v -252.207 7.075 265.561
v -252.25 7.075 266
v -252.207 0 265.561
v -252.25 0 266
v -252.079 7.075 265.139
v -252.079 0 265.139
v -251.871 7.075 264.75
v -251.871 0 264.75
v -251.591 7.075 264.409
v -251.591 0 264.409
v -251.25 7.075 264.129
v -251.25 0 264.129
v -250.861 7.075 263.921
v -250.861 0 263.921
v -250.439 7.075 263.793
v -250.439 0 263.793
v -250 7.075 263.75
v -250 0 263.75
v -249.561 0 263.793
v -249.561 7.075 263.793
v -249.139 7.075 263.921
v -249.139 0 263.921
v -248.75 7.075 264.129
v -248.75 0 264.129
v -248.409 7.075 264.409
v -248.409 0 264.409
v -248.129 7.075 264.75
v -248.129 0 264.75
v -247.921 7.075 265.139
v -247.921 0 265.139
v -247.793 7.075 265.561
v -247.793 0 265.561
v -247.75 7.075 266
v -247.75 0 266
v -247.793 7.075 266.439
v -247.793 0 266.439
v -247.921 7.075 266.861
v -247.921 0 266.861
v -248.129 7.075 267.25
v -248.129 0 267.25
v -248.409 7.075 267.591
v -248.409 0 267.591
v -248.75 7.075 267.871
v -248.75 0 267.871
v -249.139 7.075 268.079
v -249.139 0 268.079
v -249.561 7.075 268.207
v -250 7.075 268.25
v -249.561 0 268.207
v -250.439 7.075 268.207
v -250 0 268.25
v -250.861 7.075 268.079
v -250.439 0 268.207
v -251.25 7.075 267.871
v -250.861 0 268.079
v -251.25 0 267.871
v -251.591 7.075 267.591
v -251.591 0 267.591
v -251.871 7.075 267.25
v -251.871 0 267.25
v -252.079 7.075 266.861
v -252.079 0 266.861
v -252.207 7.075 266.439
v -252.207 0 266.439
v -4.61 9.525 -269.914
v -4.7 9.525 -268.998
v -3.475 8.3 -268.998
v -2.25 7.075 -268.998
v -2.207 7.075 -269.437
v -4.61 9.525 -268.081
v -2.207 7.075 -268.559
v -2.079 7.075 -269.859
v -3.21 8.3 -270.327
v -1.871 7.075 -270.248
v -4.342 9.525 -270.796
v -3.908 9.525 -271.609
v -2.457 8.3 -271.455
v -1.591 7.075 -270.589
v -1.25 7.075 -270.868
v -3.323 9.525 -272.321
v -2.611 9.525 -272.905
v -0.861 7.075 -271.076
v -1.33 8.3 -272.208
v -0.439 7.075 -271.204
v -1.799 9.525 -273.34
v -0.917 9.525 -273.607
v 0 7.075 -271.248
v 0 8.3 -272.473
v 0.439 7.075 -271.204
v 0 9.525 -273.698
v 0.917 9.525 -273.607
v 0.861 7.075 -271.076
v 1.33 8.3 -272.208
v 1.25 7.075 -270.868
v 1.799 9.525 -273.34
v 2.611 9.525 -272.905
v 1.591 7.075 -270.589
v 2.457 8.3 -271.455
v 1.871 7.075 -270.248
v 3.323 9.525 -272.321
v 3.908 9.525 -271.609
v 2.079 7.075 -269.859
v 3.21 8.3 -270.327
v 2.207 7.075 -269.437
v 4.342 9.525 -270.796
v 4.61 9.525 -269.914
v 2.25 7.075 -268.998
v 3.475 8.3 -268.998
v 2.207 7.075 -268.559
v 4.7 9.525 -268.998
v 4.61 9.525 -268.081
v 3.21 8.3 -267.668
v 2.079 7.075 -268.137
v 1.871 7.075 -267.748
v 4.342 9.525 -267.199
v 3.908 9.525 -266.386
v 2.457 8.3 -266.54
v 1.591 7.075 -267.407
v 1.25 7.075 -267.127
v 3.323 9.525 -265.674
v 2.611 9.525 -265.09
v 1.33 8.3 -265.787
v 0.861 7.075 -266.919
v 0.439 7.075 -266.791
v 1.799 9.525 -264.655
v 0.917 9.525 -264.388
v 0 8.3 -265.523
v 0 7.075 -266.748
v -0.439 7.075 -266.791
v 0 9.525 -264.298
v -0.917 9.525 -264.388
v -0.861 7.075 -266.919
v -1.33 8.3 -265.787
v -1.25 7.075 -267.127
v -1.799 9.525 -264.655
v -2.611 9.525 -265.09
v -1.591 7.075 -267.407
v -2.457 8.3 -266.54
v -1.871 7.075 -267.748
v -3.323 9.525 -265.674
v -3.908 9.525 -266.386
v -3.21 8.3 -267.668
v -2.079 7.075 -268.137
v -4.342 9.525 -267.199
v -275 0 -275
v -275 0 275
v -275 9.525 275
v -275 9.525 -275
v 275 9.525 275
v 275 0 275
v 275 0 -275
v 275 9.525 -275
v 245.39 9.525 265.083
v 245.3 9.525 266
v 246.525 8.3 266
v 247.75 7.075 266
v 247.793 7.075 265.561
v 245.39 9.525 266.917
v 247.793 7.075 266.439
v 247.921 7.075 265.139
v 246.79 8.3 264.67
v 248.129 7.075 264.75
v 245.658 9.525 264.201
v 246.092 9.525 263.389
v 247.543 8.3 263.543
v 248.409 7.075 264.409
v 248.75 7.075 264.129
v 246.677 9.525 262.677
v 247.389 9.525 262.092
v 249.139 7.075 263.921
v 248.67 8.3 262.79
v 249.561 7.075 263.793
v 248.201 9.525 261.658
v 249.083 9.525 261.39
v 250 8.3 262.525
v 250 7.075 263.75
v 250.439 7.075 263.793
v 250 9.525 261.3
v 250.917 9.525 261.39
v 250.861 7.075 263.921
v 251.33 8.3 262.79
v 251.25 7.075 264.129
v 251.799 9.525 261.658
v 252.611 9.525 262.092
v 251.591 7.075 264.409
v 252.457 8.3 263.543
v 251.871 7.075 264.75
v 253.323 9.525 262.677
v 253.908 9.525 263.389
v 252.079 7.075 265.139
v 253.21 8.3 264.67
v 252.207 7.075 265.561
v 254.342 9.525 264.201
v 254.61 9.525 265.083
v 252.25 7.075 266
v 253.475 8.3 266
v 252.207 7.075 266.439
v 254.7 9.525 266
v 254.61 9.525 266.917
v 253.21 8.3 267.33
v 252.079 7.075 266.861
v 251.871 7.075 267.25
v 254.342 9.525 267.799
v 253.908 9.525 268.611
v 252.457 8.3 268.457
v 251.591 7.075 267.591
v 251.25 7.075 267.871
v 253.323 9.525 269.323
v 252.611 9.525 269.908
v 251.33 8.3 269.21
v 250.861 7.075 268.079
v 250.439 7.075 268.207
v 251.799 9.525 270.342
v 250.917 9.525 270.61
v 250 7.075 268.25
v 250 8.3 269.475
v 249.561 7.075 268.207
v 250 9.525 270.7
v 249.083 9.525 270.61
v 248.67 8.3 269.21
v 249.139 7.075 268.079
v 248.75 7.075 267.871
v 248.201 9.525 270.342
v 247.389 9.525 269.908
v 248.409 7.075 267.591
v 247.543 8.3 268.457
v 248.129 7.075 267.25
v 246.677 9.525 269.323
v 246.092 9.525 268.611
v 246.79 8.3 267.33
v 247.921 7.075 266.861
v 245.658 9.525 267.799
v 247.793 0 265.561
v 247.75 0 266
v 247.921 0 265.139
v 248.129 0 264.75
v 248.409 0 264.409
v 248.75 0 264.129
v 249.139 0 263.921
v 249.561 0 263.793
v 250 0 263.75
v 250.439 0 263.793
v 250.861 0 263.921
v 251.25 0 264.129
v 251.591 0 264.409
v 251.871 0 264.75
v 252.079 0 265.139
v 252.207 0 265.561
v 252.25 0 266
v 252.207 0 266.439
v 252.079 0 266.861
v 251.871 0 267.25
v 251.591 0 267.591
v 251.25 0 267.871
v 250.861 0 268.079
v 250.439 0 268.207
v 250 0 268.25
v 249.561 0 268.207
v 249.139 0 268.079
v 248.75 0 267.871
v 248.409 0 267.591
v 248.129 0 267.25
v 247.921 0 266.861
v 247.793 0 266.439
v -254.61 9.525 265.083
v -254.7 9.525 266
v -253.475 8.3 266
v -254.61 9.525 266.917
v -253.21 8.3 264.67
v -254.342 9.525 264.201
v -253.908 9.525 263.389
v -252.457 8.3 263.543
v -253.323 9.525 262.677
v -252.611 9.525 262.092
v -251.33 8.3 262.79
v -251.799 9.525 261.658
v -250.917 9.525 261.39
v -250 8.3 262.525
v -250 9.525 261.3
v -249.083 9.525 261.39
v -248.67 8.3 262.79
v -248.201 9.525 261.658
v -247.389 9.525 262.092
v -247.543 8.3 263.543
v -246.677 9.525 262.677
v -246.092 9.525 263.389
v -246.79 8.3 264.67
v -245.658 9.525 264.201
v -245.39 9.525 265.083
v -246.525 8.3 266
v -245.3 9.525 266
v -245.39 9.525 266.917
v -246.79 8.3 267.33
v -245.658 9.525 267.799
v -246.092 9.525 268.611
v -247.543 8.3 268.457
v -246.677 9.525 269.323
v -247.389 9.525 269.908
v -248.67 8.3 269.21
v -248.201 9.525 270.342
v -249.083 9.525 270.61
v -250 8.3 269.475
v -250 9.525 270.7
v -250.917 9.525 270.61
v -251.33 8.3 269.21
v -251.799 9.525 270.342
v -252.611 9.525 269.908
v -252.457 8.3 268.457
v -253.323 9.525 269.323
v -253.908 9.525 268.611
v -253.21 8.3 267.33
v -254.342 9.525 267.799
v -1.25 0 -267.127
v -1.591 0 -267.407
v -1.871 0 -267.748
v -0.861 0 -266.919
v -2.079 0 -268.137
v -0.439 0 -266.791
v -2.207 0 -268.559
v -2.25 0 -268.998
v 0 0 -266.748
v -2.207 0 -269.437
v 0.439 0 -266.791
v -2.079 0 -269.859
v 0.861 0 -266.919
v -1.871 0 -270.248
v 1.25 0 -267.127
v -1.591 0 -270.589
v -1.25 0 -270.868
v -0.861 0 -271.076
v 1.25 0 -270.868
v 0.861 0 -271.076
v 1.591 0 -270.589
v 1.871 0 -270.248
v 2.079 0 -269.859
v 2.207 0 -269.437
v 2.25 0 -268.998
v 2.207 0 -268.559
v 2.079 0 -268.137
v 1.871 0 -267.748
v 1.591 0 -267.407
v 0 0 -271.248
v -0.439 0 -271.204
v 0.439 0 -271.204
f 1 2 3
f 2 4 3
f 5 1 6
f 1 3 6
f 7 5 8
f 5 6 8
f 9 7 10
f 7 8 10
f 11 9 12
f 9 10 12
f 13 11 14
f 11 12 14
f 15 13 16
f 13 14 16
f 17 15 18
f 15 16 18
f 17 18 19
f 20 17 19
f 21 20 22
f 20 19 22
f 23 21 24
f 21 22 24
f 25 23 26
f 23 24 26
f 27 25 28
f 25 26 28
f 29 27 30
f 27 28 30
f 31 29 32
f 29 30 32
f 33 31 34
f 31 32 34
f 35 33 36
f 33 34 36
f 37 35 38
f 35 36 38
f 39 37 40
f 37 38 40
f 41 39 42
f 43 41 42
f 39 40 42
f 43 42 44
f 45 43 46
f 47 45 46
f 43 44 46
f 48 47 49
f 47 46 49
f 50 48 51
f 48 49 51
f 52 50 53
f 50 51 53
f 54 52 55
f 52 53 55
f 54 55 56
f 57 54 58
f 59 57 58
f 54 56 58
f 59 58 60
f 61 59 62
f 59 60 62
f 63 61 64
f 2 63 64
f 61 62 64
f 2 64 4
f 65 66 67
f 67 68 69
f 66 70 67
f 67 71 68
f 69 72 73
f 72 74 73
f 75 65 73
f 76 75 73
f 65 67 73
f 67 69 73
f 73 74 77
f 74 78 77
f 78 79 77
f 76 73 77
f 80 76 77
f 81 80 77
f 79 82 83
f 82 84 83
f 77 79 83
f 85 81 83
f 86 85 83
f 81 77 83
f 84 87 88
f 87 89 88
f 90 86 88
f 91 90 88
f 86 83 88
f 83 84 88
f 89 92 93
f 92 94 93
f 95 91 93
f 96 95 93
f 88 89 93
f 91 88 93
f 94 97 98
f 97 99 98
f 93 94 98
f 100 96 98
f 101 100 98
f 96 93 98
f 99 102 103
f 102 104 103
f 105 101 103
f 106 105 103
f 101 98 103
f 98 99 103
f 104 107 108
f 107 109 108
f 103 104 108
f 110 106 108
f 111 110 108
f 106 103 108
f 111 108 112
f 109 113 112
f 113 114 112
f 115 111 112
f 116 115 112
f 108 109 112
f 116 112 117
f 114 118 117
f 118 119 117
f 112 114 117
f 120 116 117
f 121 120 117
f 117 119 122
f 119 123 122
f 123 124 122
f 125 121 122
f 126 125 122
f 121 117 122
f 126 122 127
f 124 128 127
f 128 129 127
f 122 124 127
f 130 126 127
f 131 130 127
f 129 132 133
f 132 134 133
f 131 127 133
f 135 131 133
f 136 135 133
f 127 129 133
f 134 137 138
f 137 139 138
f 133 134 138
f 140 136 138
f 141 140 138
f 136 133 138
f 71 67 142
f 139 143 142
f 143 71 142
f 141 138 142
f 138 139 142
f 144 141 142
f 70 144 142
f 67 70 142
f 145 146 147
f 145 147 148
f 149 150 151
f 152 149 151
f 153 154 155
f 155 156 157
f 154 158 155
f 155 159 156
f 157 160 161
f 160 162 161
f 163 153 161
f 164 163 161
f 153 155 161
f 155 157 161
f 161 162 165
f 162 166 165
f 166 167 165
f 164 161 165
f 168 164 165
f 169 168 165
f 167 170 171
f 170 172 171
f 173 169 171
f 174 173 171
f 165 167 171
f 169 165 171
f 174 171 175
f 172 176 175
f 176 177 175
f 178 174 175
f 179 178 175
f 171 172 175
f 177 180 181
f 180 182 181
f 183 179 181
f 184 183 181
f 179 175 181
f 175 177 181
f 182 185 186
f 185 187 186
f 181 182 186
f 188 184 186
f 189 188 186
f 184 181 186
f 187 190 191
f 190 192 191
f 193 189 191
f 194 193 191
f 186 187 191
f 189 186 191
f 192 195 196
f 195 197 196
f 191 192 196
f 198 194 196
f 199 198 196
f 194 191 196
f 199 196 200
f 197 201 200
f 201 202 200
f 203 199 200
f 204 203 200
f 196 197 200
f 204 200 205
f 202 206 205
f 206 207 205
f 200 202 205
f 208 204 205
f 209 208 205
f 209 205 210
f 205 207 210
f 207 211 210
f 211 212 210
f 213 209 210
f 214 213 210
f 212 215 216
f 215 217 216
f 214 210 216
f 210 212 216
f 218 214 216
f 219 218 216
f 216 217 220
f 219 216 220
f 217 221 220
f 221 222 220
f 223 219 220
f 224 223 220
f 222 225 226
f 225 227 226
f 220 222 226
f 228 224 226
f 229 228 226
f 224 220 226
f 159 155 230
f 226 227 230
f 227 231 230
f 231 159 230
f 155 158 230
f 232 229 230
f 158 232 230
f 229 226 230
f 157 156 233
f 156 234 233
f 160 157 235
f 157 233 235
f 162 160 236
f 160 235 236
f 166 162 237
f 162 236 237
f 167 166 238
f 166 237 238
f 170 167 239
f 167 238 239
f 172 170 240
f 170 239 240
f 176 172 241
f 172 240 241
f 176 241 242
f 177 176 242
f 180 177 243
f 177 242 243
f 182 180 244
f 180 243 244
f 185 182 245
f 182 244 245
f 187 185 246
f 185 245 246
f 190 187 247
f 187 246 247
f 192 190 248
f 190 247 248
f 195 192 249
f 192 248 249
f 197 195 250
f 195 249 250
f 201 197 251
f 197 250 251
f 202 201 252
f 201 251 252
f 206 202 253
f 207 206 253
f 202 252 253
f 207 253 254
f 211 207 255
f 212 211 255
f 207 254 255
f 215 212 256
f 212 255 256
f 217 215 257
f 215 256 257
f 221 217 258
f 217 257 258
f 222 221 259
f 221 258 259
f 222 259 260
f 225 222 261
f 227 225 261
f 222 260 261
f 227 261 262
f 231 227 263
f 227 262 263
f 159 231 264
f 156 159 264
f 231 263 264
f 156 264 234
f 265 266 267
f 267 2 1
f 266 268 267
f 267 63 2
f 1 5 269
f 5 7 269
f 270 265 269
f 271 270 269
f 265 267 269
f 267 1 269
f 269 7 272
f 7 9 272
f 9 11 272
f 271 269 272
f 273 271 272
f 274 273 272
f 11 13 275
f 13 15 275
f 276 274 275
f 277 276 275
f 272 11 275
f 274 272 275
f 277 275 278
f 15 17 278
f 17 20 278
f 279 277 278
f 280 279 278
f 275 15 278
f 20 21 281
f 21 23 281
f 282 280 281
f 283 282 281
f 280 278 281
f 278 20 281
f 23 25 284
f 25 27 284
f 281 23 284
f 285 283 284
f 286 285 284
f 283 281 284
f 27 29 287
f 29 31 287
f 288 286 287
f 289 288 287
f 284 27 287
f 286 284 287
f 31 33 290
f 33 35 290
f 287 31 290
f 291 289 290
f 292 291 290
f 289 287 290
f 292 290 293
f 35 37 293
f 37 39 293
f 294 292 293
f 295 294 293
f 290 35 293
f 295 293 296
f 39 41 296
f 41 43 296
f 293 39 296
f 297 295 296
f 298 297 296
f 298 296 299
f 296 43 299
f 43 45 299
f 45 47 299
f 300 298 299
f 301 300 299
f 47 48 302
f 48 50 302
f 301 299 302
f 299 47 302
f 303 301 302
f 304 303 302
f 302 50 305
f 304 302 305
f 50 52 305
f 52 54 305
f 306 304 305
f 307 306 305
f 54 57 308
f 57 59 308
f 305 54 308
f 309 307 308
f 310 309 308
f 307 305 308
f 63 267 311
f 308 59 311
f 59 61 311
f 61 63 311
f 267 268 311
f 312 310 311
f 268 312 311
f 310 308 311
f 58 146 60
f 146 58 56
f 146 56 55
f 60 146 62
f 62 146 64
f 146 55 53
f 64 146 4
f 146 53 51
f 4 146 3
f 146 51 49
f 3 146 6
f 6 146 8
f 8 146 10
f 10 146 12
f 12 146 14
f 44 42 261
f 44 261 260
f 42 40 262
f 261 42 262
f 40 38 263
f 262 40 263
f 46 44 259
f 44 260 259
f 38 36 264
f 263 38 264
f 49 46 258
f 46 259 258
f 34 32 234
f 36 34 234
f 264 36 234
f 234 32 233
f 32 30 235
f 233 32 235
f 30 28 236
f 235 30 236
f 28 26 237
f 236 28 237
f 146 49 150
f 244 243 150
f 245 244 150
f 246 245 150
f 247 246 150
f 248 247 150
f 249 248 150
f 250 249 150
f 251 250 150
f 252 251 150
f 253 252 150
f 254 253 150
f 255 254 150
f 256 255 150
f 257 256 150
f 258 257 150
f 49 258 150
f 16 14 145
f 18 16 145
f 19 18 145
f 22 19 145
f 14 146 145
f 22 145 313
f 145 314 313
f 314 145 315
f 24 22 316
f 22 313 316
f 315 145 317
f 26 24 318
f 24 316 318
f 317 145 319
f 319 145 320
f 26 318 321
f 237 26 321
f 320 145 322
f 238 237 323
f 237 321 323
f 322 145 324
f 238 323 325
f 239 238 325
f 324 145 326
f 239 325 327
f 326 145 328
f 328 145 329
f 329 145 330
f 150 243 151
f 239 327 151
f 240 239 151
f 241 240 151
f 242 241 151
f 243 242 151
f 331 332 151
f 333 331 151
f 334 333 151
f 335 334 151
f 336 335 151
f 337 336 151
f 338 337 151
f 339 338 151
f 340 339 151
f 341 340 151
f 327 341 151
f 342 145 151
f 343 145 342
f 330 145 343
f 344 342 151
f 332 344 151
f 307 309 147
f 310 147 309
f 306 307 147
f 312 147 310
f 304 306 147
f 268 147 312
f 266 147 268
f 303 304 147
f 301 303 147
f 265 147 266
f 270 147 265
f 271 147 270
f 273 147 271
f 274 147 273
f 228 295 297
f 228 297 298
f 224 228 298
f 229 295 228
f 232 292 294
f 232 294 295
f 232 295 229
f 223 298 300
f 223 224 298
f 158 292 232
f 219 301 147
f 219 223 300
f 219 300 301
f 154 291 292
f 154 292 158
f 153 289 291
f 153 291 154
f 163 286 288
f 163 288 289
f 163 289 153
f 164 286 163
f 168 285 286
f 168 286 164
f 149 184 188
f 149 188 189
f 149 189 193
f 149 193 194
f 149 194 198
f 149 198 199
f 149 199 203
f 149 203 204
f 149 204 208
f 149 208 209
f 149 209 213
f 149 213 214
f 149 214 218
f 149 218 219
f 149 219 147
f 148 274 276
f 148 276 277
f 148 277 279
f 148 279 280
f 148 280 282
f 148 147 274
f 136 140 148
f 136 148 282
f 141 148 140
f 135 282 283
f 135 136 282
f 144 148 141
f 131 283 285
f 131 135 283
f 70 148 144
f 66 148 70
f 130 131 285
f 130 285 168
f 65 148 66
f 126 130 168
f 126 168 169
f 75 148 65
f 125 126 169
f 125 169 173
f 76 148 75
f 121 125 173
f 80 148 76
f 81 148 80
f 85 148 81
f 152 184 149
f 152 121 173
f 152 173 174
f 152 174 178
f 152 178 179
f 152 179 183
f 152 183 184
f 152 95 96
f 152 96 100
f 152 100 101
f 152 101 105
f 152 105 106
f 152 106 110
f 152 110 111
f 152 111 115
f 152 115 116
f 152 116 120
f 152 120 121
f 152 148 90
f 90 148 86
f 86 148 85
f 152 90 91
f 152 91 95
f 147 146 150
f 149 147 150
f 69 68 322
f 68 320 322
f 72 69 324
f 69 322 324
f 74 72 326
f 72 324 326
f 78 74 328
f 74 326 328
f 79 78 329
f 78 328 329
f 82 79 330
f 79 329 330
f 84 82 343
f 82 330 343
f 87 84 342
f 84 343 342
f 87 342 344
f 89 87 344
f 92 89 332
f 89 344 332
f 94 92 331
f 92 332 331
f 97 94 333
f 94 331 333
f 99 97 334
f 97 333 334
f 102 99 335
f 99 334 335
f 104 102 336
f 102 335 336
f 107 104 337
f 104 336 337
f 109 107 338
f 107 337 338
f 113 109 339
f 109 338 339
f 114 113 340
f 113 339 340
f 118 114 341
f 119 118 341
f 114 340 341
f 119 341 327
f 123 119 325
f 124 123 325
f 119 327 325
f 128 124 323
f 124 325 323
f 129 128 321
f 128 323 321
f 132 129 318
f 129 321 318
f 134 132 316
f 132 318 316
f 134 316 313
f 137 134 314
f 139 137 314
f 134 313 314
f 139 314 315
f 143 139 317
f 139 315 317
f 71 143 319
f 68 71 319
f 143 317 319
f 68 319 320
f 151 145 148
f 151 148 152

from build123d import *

# Parameters (mm, degrees)
SKETCH1_W                                       = 550
SKETCH1_H                                       = 550
SKETCH1_R                                       = 2.1
SKETCH1_W_2                                     = 10
SKETCH1_H_2                                     = 16
BOSS_EXTRUDE1_DEPTH                             = 9.525
CSK_FOR_M4_FLAT_HEAD_MACHINE_SCREW1_D           = 4.5
CSK_FOR_M4_FLAT_HEAD_MACHINE_SCREW1_DEPTH       = 9.53
CSK_FOR_M4_FLAT_HEAD_MACHINE_SCREW1_CSINK_D     = 9.4
CSK_FOR_M4_FLAT_HEAD_MACHINE_SCREW1_CSINK_ANGLE = 90
CSK_FOR_M4_FLAT_HEAD_MACHINE_SCREW1_TIP         = 1.351936393


with BuildPart() as part:
    # Sketch1 → Boss-Extrude1 (new body)
    with BuildSketch(Plane(origin=(0, 0, 0), x_dir=(1, 0, 0), z_dir=(0, 1, 0))):
        Rectangle(SKETCH1_W, SKETCH1_H)
        with Locations((0, 268.997567297)):
            Circle(SKETCH1_R, mode=Mode.SUBTRACT)
        with Locations((-250, -263)):
            Rectangle(SKETCH1_W_2, SKETCH1_H_2, mode=Mode.SUBTRACT)
        with Locations((250, -263)):
            Rectangle(SKETCH1_W_2, SKETCH1_H_2, mode=Mode.SUBTRACT)
        with Locations((-250, -263)):
            Rectangle(SKETCH1_W_2, SKETCH1_H_2)
        with Locations((-250, -266)):
            Circle(SKETCH1_R, mode=Mode.SUBTRACT)
        with Locations((250, -263)):
            Rectangle(SKETCH1_W_2, SKETCH1_H_2)
        with Locations((250, -266)):
            Circle(SKETCH1_R, mode=Mode.SUBTRACT)
    extrude(amount=BOSS_EXTRUDE1_DEPTH)

    # CSK for M4 Flat Head Machine Screw1
    with Locations(Plane(origin=(0, 9.525, 0), x_dir=(1, 0, 0), z_dir=(0, 1, 0))):
        with Locations((0, 268.997567297), (250, -266), (-250, -266)):
            CounterSinkHole(CSK_FOR_M4_FLAT_HEAD_MACHINE_SCREW1_D / 2, CSK_FOR_M4_FLAT_HEAD_MACHINE_SCREW1_CSINK_D / 2, depth=CSK_FOR_M4_FLAT_HEAD_MACHINE_SCREW1_DEPTH, counter_sink_angle=CSK_FOR_M4_FLAT_HEAD_MACHINE_SCREW1_CSINK_ANGLE)
            with Locations((0, 0, -(CSK_FOR_M4_FLAT_HEAD_MACHINE_SCREW1_DEPTH + CSK_FOR_M4_FLAT_HEAD_MACHINE_SCREW1_TIP / 2))):  # 118° drill point
                Cone(0, CSK_FOR_M4_FLAT_HEAD_MACHINE_SCREW1_D / 2, CSK_FOR_M4_FLAT_HEAD_MACHINE_SCREW1_TIP, mode=Mode.SUBTRACT)


solid = part.part
